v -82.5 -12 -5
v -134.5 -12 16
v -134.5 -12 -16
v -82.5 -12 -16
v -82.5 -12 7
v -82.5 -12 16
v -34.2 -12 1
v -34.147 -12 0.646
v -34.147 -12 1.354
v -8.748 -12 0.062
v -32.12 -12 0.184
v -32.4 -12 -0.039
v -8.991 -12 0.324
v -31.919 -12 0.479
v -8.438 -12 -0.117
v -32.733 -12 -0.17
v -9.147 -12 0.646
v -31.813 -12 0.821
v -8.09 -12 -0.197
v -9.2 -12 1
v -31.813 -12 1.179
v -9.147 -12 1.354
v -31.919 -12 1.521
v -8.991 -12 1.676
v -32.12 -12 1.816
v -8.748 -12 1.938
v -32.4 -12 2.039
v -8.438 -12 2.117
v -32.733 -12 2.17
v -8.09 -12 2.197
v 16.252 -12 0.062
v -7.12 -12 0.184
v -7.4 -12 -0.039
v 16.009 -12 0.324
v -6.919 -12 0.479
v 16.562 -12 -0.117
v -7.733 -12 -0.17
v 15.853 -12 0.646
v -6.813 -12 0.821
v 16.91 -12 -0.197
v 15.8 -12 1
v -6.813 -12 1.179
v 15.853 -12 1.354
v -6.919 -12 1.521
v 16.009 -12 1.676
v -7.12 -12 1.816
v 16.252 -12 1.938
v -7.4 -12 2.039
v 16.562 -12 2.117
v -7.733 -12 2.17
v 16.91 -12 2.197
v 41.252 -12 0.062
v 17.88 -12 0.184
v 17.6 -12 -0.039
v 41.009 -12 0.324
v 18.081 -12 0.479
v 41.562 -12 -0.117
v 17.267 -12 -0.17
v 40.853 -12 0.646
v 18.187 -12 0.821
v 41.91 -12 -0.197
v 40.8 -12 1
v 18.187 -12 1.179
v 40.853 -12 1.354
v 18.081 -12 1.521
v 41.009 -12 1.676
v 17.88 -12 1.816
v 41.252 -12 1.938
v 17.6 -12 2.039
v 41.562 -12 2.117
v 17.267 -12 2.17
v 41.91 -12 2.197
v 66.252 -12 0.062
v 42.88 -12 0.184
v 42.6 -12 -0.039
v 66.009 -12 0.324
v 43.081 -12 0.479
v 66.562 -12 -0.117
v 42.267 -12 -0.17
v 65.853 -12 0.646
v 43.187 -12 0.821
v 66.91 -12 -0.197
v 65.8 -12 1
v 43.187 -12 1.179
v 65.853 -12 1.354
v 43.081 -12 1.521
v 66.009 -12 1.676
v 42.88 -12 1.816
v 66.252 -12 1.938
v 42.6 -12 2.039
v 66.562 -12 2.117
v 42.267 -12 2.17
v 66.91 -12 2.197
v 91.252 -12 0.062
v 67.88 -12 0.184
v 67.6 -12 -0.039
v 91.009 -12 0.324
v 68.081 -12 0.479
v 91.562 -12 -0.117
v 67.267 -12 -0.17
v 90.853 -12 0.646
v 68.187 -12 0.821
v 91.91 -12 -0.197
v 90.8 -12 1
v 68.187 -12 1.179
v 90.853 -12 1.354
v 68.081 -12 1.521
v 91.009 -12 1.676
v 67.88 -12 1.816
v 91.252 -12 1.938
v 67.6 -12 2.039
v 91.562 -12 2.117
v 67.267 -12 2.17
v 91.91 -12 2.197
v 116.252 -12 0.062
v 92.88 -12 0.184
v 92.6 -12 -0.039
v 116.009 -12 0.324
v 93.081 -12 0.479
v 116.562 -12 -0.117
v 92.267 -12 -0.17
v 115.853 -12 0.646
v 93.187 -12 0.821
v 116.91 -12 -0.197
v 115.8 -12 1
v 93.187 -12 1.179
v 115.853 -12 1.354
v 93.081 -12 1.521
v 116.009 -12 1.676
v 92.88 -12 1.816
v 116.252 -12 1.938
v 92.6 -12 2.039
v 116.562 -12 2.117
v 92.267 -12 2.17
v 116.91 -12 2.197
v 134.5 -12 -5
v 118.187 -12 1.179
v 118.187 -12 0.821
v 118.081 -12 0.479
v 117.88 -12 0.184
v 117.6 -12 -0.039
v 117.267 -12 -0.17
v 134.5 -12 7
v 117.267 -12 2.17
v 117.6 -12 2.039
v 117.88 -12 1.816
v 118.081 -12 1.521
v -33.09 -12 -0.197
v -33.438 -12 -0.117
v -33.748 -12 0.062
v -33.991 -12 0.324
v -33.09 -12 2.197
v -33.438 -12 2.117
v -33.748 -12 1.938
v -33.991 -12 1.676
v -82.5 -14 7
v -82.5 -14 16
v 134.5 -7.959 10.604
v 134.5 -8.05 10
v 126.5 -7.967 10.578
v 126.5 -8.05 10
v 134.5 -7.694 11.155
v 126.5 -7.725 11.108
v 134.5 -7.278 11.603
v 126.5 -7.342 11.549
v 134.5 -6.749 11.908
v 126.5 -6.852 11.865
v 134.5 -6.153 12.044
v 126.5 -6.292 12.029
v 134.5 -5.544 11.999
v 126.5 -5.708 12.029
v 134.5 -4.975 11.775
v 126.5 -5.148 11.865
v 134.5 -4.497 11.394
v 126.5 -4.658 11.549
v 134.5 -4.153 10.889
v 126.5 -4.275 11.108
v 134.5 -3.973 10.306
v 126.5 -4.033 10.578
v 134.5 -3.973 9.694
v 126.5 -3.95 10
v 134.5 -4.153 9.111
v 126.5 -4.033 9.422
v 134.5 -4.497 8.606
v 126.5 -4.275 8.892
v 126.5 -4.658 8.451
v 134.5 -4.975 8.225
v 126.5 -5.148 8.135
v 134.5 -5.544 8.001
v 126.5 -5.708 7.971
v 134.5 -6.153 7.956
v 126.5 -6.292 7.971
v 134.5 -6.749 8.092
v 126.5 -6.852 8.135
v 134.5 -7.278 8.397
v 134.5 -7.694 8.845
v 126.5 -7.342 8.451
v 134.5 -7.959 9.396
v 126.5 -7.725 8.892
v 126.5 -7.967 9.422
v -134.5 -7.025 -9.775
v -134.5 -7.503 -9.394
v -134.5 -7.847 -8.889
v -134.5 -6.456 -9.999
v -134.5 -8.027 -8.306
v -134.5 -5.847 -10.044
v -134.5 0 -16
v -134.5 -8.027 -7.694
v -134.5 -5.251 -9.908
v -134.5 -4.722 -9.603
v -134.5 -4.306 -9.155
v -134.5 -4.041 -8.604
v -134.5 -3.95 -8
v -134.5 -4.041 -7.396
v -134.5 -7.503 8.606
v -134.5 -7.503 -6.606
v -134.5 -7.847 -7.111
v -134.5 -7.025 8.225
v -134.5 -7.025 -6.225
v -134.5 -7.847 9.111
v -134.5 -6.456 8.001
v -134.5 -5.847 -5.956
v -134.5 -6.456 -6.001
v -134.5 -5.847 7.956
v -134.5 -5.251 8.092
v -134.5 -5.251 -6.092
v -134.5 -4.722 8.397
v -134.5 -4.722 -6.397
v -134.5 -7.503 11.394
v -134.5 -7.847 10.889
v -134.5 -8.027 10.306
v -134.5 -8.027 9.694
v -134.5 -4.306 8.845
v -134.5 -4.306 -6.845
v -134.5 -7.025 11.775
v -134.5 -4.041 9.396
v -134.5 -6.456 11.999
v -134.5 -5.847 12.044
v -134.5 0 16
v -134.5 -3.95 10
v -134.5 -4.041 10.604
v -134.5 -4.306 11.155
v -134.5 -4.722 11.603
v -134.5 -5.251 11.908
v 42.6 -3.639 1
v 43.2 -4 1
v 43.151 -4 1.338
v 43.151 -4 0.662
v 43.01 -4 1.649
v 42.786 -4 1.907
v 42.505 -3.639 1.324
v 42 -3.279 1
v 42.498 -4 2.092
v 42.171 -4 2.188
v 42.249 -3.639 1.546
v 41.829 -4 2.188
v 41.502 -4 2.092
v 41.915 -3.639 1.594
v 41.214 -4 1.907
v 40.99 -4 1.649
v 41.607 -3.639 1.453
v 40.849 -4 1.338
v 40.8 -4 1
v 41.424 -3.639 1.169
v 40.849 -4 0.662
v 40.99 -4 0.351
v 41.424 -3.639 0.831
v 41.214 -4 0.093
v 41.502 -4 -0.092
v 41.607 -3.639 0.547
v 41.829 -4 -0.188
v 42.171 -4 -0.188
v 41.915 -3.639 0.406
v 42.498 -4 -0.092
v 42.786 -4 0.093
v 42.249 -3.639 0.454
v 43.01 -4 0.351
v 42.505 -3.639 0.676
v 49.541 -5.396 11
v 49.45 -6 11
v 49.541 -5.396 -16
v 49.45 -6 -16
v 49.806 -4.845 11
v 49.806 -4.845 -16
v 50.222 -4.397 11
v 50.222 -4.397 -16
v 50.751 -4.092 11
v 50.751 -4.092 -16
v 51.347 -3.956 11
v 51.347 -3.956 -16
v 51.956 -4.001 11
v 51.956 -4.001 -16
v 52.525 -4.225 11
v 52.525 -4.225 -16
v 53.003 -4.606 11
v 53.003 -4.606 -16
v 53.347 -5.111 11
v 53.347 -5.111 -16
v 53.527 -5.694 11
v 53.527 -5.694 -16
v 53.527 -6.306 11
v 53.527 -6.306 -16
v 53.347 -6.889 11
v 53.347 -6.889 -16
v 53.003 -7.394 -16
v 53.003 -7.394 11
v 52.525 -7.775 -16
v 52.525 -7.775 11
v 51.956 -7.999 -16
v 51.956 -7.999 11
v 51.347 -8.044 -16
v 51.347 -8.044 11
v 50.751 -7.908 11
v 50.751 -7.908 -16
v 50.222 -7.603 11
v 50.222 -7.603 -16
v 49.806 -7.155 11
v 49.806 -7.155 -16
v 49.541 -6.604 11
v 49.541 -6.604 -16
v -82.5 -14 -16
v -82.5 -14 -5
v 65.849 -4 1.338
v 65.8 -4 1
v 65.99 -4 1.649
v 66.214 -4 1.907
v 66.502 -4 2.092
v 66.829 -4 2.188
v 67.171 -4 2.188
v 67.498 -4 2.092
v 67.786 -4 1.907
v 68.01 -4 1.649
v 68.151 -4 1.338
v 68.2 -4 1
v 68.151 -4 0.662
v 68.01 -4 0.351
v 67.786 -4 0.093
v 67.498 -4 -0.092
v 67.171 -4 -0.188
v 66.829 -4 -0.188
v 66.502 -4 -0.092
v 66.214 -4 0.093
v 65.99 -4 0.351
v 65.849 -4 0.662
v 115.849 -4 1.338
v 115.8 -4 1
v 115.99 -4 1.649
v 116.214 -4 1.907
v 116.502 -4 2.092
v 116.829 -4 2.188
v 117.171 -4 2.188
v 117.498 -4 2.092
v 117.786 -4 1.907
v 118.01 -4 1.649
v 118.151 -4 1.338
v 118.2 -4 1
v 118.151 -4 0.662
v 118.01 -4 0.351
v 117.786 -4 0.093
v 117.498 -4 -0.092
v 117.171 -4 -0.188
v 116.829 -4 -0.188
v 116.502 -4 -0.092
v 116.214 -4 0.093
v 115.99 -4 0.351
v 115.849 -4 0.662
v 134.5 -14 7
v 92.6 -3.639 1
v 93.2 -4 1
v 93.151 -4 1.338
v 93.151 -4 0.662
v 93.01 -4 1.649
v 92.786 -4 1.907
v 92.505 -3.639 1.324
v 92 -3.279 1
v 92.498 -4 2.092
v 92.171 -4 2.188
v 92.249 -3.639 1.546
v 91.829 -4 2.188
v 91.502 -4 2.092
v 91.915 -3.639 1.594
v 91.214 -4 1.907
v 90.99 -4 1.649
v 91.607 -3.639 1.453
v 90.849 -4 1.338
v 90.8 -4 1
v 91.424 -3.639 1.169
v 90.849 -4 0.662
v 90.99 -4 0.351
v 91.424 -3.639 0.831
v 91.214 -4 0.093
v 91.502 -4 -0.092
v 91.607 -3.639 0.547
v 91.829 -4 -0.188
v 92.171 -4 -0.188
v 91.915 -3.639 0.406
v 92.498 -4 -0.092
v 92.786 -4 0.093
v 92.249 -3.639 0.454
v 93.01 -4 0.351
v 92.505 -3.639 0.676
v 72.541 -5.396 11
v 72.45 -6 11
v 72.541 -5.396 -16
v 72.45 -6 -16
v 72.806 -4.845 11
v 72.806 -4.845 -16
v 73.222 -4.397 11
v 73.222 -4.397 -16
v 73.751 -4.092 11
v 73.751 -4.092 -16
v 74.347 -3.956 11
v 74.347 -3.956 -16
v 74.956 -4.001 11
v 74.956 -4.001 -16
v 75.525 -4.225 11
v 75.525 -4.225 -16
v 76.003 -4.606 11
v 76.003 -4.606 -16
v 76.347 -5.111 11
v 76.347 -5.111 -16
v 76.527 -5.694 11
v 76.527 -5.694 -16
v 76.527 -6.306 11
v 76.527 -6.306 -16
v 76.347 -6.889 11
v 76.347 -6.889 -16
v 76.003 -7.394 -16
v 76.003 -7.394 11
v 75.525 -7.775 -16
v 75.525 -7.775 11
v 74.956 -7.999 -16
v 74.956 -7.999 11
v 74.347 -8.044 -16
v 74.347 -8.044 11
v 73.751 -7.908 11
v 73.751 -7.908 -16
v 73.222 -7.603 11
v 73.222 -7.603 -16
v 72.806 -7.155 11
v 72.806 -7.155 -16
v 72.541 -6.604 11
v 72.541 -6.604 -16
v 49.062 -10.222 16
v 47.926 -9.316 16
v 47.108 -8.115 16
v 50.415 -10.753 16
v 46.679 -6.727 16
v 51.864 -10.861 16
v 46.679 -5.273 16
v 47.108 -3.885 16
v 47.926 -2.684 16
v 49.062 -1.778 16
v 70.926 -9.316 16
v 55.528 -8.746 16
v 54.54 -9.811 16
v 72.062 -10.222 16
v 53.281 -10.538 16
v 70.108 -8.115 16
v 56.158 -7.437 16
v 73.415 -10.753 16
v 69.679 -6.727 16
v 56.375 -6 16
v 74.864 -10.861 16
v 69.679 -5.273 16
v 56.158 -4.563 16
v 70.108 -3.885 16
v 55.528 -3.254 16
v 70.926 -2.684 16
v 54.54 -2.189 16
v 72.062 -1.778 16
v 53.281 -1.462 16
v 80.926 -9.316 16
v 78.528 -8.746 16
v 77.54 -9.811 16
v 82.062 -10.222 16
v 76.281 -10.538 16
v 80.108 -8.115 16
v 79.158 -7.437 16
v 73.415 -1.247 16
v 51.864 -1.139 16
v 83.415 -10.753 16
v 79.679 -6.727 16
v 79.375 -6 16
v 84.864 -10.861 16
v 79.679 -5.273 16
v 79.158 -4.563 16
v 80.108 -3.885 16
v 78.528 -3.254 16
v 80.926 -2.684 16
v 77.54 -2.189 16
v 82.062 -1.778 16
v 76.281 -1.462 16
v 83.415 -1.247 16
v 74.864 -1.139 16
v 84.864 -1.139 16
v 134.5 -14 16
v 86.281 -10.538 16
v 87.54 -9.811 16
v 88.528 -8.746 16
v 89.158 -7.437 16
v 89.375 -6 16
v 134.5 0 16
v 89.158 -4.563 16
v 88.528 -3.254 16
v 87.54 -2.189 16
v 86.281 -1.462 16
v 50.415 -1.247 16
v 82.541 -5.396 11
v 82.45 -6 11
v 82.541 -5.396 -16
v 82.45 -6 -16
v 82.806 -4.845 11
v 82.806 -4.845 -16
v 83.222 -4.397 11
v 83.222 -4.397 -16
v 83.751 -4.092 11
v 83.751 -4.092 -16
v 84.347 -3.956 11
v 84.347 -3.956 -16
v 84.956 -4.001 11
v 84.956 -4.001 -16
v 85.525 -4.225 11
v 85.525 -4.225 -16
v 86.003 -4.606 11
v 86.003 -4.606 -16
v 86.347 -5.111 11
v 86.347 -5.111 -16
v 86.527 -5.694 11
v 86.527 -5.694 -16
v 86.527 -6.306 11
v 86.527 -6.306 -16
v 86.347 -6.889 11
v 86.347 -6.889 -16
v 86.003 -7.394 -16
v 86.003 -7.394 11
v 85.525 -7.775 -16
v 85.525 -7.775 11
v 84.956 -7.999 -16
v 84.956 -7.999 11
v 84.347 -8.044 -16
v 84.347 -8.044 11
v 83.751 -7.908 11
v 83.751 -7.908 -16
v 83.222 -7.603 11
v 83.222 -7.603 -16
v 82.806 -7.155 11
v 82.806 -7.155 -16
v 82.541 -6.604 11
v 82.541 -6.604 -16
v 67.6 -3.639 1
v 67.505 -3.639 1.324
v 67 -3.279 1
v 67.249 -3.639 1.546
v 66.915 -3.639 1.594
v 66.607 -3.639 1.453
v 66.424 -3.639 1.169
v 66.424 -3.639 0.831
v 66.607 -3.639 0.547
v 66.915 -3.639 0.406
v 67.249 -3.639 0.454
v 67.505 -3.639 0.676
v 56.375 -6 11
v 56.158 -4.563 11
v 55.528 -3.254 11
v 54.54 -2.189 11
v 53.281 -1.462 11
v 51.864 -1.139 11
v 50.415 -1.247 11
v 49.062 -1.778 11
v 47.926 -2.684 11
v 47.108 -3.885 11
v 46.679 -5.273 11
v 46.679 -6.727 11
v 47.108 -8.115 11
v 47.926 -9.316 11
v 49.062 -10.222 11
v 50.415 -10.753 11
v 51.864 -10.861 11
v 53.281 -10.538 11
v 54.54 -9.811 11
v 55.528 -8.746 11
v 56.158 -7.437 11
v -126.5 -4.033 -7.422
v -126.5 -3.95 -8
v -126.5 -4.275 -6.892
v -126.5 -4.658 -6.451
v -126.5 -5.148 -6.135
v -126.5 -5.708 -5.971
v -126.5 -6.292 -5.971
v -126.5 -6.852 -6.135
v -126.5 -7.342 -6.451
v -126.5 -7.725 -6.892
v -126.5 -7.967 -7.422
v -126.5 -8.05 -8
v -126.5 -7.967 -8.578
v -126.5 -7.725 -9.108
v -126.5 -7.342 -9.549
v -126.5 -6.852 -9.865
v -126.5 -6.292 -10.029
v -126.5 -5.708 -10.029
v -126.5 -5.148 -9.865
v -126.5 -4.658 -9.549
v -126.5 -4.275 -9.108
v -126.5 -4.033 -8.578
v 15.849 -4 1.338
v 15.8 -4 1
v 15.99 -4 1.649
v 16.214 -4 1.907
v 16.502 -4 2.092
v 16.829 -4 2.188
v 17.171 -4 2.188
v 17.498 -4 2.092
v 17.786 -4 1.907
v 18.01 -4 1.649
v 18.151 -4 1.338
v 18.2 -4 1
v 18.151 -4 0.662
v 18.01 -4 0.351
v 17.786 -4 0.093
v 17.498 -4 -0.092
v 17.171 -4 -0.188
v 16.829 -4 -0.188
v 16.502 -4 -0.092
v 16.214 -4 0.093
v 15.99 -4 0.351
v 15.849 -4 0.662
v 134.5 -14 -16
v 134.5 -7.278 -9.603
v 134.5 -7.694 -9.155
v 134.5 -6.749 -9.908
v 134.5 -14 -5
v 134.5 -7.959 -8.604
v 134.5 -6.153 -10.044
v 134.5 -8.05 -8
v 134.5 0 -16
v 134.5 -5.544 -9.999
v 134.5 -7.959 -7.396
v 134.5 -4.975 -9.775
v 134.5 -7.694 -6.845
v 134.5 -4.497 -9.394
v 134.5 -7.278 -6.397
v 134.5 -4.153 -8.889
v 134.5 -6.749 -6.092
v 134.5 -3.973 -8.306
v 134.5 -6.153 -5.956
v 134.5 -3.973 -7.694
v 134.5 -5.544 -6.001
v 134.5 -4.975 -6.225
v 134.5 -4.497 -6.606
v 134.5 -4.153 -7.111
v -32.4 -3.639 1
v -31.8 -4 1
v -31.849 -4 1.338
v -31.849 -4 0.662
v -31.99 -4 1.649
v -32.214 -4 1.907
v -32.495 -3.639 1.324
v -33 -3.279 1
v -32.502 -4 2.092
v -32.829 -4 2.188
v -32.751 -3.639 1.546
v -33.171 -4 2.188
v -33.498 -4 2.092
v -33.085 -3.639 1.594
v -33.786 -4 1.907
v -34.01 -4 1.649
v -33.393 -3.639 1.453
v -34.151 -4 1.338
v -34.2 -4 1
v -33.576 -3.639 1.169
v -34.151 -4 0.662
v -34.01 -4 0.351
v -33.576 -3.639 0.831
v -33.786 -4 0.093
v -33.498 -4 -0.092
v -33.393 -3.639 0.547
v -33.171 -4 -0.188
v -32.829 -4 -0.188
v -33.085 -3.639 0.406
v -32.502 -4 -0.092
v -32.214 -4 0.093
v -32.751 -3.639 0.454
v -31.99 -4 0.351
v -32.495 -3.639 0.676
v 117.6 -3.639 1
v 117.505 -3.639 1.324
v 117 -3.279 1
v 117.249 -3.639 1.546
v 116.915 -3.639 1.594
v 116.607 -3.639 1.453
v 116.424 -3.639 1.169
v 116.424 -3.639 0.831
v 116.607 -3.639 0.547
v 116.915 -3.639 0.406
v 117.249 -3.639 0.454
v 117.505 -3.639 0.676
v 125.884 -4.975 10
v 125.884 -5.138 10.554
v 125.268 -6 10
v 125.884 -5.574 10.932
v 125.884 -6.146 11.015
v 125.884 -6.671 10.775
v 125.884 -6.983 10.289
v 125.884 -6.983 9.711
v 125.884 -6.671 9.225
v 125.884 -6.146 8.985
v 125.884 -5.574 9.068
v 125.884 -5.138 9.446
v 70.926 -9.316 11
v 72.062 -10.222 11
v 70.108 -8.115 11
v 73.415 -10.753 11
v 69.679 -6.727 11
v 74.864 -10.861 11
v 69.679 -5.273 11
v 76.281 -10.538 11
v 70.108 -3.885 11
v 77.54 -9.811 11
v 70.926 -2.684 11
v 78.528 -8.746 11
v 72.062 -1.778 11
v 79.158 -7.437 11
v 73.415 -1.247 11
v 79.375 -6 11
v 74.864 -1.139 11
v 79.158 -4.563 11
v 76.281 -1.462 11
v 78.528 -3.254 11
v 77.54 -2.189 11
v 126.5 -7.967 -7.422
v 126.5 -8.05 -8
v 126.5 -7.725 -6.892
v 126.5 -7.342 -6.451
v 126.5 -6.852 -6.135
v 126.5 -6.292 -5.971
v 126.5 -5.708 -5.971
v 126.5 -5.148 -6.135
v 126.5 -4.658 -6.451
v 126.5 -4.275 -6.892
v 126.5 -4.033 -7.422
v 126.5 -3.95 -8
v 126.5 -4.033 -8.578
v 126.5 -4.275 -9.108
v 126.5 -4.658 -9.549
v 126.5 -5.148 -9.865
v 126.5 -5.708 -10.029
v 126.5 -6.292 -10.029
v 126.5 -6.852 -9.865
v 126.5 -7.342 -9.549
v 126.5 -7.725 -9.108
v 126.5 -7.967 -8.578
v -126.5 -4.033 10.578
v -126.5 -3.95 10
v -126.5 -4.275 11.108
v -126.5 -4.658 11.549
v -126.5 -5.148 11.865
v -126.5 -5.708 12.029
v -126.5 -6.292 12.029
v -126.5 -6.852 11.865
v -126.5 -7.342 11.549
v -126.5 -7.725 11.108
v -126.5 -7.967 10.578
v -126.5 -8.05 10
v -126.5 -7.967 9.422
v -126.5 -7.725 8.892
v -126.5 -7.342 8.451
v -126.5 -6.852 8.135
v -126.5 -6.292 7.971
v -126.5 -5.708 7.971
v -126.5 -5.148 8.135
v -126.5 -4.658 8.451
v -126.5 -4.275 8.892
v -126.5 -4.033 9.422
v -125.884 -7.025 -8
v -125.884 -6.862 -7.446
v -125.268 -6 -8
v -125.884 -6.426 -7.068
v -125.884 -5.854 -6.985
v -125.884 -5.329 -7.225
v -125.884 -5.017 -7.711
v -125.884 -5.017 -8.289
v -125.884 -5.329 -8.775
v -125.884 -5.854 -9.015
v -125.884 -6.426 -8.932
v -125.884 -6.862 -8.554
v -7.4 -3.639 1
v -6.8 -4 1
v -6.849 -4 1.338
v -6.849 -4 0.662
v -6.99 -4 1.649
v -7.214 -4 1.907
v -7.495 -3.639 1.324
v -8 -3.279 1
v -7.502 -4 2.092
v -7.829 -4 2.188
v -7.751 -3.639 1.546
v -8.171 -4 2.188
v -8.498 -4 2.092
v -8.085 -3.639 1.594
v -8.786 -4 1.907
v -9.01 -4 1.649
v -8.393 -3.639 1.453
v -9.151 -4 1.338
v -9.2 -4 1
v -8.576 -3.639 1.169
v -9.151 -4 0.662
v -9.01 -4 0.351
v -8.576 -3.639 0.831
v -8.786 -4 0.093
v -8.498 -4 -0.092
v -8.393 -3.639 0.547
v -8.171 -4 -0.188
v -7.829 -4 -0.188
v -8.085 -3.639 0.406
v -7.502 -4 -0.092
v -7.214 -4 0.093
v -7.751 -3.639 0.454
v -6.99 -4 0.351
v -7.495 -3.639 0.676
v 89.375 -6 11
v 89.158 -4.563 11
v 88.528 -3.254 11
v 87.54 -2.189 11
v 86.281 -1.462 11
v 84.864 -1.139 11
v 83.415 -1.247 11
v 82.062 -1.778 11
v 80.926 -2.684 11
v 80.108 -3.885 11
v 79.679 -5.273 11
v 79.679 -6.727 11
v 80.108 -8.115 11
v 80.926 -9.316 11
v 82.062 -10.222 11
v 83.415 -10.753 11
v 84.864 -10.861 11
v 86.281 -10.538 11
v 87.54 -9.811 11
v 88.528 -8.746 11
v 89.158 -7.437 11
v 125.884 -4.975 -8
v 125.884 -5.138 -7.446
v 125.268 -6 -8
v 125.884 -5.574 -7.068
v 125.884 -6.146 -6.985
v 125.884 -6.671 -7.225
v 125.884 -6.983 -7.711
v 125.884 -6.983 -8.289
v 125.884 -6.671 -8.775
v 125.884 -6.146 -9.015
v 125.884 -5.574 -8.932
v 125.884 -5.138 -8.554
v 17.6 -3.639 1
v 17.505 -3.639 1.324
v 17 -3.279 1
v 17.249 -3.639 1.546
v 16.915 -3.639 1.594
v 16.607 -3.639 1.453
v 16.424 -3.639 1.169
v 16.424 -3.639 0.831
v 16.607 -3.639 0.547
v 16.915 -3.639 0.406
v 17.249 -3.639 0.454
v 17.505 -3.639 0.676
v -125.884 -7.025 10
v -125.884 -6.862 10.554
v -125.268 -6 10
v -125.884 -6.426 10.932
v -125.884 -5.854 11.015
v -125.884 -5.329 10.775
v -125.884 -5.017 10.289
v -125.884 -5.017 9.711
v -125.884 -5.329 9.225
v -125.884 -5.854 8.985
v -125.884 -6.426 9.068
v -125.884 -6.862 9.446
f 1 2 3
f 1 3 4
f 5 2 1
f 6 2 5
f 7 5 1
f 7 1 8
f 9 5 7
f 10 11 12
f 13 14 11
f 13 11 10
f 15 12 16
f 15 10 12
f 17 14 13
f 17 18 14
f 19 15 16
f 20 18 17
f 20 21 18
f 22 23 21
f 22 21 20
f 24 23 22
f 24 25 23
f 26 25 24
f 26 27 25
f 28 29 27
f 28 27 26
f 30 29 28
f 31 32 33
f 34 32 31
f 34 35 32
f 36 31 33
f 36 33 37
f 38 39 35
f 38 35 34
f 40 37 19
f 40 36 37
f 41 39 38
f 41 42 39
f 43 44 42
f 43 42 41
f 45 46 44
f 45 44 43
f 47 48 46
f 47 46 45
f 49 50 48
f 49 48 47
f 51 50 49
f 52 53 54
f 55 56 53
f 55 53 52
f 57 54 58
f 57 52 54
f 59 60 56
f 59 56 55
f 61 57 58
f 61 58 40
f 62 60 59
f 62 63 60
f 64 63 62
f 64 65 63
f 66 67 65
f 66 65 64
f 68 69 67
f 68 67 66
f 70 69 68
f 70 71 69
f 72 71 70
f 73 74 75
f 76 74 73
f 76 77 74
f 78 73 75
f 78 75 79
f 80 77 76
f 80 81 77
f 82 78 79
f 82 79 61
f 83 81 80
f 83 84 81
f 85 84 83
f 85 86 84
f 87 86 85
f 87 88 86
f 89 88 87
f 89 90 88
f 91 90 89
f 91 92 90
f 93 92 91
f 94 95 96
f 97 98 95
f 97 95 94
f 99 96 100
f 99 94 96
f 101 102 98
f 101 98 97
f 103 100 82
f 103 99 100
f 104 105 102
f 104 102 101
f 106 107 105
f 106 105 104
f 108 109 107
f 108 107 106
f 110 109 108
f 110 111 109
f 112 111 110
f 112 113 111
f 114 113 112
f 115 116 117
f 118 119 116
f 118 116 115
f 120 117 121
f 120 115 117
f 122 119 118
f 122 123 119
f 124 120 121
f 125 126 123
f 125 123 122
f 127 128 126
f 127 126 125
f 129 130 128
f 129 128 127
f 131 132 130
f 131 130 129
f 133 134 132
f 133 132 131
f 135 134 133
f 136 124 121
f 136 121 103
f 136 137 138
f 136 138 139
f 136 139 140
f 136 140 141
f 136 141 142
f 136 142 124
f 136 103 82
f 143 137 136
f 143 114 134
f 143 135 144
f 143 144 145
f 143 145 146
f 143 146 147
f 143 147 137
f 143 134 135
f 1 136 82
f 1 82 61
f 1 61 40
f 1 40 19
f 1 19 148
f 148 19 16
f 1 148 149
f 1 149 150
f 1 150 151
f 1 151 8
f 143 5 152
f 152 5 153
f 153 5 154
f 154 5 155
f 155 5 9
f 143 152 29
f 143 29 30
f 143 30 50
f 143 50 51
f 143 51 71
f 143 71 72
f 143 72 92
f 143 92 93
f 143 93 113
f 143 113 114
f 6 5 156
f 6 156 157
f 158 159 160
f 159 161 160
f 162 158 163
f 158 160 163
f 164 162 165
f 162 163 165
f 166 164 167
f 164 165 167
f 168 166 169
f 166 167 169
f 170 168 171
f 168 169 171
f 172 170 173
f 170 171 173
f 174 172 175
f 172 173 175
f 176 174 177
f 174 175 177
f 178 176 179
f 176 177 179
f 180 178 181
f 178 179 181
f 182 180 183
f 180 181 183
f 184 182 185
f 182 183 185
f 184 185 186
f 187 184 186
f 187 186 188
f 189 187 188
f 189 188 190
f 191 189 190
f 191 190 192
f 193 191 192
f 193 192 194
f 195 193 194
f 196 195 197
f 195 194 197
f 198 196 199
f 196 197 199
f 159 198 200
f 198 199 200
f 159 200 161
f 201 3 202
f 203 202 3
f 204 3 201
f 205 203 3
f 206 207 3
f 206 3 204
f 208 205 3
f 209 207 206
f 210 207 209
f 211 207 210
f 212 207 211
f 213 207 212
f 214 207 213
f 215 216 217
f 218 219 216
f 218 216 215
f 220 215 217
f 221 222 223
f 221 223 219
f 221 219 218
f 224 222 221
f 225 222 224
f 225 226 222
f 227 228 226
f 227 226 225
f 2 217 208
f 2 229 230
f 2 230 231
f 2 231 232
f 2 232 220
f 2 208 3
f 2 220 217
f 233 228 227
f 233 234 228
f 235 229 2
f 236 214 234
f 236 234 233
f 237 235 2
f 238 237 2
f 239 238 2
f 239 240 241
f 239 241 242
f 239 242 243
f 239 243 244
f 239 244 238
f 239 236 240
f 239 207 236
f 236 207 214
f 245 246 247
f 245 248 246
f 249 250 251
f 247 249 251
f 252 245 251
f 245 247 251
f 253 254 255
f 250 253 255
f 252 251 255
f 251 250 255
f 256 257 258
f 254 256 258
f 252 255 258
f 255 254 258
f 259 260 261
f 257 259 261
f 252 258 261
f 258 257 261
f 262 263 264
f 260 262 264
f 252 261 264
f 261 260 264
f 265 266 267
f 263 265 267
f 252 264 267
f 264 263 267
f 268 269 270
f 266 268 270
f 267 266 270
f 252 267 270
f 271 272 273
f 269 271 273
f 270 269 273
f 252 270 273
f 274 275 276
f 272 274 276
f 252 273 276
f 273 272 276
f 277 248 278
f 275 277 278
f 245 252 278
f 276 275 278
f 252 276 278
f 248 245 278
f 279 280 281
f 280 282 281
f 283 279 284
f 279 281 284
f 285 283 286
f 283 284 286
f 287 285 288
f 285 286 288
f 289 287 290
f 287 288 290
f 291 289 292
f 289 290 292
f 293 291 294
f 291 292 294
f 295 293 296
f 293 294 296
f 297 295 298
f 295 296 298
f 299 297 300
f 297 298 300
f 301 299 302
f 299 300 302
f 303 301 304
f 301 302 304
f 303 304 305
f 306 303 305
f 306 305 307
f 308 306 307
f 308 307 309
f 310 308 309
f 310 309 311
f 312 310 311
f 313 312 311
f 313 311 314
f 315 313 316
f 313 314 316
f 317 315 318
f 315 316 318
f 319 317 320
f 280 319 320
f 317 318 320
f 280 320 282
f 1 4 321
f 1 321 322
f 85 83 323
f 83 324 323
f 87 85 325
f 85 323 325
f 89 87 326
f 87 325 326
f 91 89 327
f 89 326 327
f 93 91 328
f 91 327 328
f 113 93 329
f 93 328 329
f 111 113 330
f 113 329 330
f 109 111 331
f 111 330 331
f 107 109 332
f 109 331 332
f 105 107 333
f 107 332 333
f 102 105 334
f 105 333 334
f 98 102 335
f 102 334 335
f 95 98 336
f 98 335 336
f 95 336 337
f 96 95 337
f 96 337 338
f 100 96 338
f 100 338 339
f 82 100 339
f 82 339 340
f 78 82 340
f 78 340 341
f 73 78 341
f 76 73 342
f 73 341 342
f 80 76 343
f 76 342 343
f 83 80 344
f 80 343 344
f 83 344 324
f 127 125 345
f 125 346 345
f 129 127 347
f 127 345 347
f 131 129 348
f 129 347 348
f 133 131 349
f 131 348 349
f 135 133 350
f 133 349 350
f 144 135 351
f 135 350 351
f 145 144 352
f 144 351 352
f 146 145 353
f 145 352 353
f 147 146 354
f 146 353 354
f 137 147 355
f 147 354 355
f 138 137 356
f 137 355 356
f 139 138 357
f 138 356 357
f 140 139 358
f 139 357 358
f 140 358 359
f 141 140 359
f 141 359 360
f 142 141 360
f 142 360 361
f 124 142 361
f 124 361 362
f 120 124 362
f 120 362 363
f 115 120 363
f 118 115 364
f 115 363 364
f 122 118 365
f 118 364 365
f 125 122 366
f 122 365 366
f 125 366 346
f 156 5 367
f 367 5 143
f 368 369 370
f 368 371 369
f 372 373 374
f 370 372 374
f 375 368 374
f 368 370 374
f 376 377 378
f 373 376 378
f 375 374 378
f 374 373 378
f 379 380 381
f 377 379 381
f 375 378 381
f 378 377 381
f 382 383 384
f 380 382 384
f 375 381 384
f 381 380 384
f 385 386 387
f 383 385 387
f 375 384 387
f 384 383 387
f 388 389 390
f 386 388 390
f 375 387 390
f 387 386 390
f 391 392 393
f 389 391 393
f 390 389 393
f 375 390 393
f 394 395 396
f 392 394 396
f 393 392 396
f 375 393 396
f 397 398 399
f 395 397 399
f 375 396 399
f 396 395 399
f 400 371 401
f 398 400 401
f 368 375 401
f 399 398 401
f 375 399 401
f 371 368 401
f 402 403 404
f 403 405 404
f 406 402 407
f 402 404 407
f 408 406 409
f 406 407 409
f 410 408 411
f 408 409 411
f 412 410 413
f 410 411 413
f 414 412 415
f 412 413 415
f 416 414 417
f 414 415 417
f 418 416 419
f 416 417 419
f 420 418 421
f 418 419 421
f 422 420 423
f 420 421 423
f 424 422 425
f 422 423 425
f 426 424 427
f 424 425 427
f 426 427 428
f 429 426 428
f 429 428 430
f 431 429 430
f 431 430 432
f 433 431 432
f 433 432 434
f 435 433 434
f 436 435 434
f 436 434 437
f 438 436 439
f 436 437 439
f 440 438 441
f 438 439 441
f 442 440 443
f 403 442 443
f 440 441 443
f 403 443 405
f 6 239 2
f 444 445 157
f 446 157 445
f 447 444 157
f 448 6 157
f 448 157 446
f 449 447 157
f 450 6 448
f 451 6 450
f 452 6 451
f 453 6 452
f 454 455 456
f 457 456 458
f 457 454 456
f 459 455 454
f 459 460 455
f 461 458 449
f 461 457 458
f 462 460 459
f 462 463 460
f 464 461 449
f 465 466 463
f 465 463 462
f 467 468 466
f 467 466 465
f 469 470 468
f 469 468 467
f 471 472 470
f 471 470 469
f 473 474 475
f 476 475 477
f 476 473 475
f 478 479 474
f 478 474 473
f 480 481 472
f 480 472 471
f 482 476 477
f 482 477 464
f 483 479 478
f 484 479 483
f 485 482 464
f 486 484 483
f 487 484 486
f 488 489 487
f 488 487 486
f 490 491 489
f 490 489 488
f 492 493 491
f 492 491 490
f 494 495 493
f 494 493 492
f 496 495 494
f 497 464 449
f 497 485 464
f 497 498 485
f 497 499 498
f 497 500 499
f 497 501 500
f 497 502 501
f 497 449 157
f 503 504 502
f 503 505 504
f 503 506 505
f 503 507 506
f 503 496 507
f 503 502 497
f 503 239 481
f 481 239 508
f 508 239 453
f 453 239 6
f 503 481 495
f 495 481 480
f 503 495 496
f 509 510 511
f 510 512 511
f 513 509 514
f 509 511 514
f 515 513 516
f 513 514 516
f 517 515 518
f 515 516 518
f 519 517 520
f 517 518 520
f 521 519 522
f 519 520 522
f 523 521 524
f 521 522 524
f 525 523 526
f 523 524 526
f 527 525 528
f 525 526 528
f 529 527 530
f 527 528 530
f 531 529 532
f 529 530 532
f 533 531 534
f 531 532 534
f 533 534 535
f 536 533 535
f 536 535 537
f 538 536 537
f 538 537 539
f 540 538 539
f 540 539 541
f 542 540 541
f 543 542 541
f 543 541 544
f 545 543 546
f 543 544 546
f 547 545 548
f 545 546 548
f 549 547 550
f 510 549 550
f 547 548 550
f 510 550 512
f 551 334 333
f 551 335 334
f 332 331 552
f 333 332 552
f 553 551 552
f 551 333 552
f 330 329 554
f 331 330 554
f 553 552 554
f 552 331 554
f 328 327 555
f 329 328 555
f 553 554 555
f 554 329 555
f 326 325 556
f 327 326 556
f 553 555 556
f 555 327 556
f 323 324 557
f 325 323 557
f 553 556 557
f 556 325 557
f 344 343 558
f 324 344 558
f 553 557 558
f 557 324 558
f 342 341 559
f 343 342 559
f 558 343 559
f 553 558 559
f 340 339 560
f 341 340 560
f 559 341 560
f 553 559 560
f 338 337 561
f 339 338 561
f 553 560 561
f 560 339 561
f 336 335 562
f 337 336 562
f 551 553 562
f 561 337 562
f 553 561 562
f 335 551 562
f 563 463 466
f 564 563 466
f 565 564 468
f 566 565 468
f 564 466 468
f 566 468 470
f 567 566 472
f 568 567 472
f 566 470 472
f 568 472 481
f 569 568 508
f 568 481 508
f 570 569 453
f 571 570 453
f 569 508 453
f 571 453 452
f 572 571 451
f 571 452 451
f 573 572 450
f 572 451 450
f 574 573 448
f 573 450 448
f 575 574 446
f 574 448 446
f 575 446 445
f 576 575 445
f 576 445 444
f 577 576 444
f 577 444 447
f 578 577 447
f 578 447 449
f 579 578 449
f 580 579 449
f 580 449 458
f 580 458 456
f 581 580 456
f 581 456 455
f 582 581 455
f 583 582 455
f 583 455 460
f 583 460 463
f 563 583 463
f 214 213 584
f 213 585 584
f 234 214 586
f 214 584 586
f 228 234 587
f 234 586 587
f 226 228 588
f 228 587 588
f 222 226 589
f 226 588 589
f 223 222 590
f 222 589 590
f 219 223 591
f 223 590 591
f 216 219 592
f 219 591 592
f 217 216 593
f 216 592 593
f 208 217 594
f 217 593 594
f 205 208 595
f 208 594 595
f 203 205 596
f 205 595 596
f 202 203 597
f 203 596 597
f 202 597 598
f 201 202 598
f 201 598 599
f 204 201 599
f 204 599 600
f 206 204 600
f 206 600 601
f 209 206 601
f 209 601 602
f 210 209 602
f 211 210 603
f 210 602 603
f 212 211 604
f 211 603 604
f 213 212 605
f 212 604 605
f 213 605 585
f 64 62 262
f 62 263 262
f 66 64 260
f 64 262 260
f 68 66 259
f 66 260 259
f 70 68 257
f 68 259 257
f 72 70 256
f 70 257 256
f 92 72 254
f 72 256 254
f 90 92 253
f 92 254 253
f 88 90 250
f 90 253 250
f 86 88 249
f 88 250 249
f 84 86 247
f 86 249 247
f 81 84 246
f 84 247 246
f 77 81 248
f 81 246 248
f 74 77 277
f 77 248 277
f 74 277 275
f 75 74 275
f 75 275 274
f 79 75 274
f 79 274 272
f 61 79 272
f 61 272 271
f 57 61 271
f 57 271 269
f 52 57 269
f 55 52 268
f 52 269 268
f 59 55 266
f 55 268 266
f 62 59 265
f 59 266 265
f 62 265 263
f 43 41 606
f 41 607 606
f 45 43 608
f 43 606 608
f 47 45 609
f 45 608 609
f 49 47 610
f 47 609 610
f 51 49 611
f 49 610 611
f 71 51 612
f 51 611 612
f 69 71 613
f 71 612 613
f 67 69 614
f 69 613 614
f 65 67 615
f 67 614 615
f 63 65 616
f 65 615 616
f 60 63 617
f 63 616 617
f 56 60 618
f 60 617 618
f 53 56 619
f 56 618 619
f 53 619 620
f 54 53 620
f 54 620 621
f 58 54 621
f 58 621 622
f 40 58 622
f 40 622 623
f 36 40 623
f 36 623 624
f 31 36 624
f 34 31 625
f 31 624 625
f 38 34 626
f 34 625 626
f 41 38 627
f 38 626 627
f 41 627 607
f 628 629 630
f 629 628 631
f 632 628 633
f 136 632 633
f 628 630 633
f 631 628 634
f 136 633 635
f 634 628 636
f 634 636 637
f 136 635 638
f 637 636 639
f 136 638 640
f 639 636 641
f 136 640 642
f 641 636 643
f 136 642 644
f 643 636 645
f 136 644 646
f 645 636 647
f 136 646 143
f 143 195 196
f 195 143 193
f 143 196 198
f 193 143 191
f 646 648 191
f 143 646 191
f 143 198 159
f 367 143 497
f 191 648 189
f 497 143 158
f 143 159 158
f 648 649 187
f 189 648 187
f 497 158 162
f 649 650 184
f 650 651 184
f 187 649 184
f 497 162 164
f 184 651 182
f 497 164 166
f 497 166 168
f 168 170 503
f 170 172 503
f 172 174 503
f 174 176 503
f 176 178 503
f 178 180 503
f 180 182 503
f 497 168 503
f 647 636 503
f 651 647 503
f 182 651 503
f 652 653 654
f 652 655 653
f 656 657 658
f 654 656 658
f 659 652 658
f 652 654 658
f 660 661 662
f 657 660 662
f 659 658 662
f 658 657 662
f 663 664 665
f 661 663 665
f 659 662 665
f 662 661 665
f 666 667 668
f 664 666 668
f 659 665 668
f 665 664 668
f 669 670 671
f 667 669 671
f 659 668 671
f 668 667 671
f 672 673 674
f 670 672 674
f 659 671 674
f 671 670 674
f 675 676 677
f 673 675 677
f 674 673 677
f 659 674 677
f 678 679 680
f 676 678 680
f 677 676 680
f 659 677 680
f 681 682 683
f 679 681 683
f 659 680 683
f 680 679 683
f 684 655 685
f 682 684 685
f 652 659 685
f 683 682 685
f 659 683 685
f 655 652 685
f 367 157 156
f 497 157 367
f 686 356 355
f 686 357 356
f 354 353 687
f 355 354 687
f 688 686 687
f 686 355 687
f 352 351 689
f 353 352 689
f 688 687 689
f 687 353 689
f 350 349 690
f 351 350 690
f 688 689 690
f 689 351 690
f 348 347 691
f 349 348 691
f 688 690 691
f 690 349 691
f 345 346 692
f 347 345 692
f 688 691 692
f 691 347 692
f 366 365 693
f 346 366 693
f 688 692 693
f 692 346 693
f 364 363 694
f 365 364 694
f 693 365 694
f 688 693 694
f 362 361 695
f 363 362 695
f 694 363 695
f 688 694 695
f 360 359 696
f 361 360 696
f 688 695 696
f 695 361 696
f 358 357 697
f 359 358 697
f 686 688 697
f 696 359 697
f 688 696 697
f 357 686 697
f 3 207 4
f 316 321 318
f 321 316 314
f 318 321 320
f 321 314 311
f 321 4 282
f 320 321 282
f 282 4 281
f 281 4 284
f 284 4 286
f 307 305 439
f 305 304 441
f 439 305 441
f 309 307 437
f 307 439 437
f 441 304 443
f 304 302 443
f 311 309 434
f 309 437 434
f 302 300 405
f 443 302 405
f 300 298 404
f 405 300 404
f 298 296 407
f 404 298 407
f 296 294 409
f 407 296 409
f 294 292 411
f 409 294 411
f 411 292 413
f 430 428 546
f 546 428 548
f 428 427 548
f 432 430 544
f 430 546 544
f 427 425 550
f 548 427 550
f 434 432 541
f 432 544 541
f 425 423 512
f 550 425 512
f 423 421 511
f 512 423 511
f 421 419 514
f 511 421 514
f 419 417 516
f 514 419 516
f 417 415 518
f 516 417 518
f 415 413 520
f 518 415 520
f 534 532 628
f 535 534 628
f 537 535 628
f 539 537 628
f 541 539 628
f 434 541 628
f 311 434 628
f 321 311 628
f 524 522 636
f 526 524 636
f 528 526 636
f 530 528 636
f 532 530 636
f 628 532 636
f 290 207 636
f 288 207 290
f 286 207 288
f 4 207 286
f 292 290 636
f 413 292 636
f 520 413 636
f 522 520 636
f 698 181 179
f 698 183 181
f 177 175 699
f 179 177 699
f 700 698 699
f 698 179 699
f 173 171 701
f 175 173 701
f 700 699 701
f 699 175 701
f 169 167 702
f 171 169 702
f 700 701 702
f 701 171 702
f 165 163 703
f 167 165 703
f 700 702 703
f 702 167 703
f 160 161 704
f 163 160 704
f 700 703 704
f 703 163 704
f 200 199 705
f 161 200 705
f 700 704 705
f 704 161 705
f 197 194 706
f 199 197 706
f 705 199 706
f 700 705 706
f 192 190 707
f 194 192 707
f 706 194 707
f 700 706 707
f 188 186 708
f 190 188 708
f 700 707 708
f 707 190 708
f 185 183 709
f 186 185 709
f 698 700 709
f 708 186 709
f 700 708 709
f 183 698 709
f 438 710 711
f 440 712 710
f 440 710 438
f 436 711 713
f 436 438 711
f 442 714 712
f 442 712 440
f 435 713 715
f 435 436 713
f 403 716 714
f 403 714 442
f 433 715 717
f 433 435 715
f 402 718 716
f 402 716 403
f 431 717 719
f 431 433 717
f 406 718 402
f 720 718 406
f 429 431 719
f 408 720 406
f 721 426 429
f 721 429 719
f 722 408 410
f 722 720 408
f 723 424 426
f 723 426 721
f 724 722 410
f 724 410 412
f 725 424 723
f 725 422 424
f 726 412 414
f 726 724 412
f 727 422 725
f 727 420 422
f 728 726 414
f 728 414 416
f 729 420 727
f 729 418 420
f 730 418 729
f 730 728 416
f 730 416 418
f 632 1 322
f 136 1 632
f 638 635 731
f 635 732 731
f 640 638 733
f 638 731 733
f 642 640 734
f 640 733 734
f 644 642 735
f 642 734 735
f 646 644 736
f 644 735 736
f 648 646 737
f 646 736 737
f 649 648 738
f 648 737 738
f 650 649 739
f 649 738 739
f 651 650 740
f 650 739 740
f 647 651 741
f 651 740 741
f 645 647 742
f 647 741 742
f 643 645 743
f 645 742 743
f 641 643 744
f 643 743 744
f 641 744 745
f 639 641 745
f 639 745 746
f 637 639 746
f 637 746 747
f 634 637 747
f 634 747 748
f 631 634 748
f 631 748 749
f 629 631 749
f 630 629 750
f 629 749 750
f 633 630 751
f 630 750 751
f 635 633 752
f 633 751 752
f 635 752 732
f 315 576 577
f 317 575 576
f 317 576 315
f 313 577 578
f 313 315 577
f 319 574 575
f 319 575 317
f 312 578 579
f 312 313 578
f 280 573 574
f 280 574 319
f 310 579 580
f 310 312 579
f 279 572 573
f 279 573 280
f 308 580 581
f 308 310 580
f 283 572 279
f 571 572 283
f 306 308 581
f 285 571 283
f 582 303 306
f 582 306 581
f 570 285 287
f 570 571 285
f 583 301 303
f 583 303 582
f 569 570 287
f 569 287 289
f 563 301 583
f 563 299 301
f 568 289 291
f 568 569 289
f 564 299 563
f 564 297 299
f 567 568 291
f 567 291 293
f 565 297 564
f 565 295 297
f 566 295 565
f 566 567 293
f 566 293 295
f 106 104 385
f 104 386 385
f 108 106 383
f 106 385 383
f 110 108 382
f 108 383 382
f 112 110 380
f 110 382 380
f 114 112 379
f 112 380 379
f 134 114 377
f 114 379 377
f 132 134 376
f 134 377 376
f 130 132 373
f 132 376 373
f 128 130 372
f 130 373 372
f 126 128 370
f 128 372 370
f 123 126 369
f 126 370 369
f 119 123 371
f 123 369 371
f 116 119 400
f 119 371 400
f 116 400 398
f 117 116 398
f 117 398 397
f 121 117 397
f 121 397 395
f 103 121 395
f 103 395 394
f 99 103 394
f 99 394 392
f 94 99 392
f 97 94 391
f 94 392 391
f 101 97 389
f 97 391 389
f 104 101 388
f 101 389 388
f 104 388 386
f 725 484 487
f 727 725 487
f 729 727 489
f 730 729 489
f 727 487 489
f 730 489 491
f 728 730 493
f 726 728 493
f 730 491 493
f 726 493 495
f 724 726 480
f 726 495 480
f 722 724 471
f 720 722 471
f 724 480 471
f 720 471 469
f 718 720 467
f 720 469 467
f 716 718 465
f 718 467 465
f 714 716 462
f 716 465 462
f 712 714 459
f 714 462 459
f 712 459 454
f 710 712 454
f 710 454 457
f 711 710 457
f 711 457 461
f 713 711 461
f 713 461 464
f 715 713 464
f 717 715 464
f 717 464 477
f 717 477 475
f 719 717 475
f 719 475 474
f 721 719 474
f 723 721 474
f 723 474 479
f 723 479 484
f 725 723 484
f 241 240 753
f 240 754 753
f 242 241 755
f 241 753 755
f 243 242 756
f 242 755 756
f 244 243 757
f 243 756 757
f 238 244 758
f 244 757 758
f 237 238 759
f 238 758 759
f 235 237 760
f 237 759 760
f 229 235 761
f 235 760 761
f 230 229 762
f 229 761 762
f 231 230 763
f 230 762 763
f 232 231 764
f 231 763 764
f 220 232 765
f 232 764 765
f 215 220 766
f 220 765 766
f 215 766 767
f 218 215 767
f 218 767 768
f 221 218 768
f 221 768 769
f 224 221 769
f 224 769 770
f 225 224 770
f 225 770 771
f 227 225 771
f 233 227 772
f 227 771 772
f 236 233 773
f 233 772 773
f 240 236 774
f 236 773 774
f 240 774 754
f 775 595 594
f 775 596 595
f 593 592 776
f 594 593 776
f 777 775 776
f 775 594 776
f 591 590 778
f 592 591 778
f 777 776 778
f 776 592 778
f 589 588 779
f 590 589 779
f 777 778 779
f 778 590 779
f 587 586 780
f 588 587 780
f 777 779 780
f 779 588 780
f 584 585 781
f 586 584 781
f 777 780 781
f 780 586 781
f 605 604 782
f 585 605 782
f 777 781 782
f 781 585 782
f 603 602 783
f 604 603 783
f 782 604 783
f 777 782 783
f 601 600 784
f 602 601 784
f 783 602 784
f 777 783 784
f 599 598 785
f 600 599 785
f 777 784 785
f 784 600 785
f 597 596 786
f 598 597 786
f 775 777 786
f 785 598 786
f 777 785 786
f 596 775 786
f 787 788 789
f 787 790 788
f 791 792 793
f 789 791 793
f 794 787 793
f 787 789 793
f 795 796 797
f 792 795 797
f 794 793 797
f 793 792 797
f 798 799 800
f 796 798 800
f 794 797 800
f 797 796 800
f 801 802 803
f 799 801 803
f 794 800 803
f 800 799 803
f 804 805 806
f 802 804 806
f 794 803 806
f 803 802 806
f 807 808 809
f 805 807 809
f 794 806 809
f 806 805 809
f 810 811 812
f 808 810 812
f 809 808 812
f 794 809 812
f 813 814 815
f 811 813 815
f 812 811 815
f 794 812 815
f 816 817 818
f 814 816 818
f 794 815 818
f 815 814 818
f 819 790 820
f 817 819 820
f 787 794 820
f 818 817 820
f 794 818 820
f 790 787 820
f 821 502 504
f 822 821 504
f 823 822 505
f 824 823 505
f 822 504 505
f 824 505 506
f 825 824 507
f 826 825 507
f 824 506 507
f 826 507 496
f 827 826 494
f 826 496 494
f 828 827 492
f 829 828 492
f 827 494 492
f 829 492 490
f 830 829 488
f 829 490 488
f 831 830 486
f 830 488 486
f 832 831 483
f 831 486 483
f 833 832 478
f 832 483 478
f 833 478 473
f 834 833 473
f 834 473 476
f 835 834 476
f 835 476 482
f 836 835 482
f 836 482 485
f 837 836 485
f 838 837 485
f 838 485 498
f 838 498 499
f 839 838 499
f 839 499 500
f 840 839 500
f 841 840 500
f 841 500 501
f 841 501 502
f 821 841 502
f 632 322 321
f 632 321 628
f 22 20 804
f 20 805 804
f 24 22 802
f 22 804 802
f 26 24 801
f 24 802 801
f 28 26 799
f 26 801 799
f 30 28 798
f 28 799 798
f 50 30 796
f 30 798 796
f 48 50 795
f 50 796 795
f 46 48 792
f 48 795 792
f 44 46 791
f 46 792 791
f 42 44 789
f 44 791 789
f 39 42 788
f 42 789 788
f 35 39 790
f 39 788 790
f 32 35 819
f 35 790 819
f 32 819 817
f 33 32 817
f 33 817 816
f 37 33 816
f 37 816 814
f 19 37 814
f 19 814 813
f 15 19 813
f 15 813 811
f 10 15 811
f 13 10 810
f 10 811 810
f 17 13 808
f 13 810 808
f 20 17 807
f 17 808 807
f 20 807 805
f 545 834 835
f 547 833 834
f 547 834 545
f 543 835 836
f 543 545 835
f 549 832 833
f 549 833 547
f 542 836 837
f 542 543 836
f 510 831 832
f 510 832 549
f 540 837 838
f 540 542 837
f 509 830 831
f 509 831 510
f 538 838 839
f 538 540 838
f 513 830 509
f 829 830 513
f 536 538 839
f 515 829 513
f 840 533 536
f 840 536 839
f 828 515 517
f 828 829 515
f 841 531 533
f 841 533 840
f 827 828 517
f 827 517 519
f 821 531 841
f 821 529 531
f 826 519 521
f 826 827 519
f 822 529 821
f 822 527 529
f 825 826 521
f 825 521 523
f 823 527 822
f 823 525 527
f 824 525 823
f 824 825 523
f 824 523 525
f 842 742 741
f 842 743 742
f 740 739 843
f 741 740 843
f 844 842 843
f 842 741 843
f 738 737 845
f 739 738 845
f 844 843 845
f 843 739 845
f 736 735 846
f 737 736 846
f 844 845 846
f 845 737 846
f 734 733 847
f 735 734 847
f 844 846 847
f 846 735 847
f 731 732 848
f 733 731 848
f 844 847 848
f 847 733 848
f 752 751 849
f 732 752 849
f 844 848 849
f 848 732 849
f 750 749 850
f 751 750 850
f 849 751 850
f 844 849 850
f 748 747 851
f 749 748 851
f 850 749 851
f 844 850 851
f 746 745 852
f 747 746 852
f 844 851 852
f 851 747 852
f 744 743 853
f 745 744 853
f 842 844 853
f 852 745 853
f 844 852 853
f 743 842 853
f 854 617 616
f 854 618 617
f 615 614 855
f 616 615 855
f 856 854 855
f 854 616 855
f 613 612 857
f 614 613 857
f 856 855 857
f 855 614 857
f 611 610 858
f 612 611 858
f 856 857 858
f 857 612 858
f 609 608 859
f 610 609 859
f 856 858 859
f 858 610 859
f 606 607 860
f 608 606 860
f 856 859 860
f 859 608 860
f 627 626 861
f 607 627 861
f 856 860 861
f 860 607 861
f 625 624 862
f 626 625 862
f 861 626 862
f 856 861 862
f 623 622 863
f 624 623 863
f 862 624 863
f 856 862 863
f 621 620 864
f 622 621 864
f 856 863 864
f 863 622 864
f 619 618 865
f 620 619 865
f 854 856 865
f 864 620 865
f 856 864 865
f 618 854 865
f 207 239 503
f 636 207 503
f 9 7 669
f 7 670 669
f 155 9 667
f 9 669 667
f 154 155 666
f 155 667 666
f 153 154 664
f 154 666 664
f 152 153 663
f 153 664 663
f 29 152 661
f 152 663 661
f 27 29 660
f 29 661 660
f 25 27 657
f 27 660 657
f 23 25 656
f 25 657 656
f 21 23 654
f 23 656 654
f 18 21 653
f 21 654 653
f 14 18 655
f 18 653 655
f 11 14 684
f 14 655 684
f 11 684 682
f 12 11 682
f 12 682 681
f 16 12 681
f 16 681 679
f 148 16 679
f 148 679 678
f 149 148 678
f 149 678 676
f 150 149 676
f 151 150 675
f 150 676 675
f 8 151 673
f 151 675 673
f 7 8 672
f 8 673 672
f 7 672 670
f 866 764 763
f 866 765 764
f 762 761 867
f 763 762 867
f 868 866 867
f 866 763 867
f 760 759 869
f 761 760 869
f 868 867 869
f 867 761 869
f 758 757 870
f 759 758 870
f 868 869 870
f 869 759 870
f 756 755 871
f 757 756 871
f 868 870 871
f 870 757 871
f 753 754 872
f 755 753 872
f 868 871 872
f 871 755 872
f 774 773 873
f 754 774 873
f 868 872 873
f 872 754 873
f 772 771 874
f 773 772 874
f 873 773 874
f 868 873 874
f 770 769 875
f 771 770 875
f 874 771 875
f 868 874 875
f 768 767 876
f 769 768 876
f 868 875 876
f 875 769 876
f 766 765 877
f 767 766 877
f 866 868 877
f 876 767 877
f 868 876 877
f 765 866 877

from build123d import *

# Parameters (mm, degrees)
F0_W            = 269
F0_H            = 32
F1_DEPTH        = 12
F2_W            = 217
F2_H            = 9
F2_H_2          = 11
F3_DEPTH        = 2
F5_D            = 2.4
F5_DEPTH        = 8
F5_TIP          = 0.7210327428
F7_D            = 4.1
F7_DEPTH        = 8
F7_TIP          = 1.231764269
F9_D            = 4.1
F9_DEPTH        = 8
F9_TIP          = 1.231764269
F11_D           = 4.1
F11_CBORE_D     = 9.75
F11_CBORE_DEPTH = 5


with BuildPart() as f1:
    # F0 (on Front) → F1 (new body)
    with BuildSketch(Plane.XZ):
        Rectangle(F0_W, F0_H)
    extrude(amount=F1_DEPTH)

    # F2 (on face) → F3 (join)
    with BuildSketch(Plane.XZ.offset(12)):
        with Locations((26, 11.5)):
            Rectangle(F2_W, F2_H)
        with Locations((26, -10.5)):
            Rectangle(F2_W, F2_H_2)
    extrude(amount=F3_DEPTH)

    # F5
    with Locations(Plane.XZ.offset(12)):
        with Locations((-33, 1), (-8, 1), (17, 1), (42, 1), (67, 1), (92, 1), (117, 1)):
            Hole(F5_D / 2, depth=F5_DEPTH)
            with Locations((0, 0, -(F5_DEPTH + F5_TIP / 2))):  # 118° drill point
                Cone(0, F5_D / 2, F5_TIP, mode=Mode.SUBTRACT)

    # F7
    with Locations(Plane.YZ.offset(134.5)):
        with Locations((-6, 10), (-6, -8)):
            Hole(F7_D / 2, depth=F7_DEPTH)
            with Locations((0, 0, -(F7_DEPTH + F7_TIP / 2))):  # 118° drill point
                Cone(0, F7_D / 2, F7_TIP, mode=Mode.SUBTRACT)

    # F9
    with Locations(Plane(origin=(-134.5, 0, 0), x_dir=(0, -1, 0), z_dir=(-1, 0, 0))):
        with Locations((6, 10), (6, -8)):
            Hole(F9_D / 2, depth=F9_DEPTH)
            with Locations((0, 0, -(F9_DEPTH + F9_TIP / 2))):  # 118° drill point
                Cone(0, F9_D / 2, F9_TIP, mode=Mode.SUBTRACT)

    # F11 (through all)
    with Locations(Plane.XY.offset(16)):
        with Locations((51.5, -6), (74.5, -6), (84.5, -6)):
            CounterBoreHole(F11_D / 2, F11_CBORE_D / 2, F11_CBORE_DEPTH)


solid = f1.part
